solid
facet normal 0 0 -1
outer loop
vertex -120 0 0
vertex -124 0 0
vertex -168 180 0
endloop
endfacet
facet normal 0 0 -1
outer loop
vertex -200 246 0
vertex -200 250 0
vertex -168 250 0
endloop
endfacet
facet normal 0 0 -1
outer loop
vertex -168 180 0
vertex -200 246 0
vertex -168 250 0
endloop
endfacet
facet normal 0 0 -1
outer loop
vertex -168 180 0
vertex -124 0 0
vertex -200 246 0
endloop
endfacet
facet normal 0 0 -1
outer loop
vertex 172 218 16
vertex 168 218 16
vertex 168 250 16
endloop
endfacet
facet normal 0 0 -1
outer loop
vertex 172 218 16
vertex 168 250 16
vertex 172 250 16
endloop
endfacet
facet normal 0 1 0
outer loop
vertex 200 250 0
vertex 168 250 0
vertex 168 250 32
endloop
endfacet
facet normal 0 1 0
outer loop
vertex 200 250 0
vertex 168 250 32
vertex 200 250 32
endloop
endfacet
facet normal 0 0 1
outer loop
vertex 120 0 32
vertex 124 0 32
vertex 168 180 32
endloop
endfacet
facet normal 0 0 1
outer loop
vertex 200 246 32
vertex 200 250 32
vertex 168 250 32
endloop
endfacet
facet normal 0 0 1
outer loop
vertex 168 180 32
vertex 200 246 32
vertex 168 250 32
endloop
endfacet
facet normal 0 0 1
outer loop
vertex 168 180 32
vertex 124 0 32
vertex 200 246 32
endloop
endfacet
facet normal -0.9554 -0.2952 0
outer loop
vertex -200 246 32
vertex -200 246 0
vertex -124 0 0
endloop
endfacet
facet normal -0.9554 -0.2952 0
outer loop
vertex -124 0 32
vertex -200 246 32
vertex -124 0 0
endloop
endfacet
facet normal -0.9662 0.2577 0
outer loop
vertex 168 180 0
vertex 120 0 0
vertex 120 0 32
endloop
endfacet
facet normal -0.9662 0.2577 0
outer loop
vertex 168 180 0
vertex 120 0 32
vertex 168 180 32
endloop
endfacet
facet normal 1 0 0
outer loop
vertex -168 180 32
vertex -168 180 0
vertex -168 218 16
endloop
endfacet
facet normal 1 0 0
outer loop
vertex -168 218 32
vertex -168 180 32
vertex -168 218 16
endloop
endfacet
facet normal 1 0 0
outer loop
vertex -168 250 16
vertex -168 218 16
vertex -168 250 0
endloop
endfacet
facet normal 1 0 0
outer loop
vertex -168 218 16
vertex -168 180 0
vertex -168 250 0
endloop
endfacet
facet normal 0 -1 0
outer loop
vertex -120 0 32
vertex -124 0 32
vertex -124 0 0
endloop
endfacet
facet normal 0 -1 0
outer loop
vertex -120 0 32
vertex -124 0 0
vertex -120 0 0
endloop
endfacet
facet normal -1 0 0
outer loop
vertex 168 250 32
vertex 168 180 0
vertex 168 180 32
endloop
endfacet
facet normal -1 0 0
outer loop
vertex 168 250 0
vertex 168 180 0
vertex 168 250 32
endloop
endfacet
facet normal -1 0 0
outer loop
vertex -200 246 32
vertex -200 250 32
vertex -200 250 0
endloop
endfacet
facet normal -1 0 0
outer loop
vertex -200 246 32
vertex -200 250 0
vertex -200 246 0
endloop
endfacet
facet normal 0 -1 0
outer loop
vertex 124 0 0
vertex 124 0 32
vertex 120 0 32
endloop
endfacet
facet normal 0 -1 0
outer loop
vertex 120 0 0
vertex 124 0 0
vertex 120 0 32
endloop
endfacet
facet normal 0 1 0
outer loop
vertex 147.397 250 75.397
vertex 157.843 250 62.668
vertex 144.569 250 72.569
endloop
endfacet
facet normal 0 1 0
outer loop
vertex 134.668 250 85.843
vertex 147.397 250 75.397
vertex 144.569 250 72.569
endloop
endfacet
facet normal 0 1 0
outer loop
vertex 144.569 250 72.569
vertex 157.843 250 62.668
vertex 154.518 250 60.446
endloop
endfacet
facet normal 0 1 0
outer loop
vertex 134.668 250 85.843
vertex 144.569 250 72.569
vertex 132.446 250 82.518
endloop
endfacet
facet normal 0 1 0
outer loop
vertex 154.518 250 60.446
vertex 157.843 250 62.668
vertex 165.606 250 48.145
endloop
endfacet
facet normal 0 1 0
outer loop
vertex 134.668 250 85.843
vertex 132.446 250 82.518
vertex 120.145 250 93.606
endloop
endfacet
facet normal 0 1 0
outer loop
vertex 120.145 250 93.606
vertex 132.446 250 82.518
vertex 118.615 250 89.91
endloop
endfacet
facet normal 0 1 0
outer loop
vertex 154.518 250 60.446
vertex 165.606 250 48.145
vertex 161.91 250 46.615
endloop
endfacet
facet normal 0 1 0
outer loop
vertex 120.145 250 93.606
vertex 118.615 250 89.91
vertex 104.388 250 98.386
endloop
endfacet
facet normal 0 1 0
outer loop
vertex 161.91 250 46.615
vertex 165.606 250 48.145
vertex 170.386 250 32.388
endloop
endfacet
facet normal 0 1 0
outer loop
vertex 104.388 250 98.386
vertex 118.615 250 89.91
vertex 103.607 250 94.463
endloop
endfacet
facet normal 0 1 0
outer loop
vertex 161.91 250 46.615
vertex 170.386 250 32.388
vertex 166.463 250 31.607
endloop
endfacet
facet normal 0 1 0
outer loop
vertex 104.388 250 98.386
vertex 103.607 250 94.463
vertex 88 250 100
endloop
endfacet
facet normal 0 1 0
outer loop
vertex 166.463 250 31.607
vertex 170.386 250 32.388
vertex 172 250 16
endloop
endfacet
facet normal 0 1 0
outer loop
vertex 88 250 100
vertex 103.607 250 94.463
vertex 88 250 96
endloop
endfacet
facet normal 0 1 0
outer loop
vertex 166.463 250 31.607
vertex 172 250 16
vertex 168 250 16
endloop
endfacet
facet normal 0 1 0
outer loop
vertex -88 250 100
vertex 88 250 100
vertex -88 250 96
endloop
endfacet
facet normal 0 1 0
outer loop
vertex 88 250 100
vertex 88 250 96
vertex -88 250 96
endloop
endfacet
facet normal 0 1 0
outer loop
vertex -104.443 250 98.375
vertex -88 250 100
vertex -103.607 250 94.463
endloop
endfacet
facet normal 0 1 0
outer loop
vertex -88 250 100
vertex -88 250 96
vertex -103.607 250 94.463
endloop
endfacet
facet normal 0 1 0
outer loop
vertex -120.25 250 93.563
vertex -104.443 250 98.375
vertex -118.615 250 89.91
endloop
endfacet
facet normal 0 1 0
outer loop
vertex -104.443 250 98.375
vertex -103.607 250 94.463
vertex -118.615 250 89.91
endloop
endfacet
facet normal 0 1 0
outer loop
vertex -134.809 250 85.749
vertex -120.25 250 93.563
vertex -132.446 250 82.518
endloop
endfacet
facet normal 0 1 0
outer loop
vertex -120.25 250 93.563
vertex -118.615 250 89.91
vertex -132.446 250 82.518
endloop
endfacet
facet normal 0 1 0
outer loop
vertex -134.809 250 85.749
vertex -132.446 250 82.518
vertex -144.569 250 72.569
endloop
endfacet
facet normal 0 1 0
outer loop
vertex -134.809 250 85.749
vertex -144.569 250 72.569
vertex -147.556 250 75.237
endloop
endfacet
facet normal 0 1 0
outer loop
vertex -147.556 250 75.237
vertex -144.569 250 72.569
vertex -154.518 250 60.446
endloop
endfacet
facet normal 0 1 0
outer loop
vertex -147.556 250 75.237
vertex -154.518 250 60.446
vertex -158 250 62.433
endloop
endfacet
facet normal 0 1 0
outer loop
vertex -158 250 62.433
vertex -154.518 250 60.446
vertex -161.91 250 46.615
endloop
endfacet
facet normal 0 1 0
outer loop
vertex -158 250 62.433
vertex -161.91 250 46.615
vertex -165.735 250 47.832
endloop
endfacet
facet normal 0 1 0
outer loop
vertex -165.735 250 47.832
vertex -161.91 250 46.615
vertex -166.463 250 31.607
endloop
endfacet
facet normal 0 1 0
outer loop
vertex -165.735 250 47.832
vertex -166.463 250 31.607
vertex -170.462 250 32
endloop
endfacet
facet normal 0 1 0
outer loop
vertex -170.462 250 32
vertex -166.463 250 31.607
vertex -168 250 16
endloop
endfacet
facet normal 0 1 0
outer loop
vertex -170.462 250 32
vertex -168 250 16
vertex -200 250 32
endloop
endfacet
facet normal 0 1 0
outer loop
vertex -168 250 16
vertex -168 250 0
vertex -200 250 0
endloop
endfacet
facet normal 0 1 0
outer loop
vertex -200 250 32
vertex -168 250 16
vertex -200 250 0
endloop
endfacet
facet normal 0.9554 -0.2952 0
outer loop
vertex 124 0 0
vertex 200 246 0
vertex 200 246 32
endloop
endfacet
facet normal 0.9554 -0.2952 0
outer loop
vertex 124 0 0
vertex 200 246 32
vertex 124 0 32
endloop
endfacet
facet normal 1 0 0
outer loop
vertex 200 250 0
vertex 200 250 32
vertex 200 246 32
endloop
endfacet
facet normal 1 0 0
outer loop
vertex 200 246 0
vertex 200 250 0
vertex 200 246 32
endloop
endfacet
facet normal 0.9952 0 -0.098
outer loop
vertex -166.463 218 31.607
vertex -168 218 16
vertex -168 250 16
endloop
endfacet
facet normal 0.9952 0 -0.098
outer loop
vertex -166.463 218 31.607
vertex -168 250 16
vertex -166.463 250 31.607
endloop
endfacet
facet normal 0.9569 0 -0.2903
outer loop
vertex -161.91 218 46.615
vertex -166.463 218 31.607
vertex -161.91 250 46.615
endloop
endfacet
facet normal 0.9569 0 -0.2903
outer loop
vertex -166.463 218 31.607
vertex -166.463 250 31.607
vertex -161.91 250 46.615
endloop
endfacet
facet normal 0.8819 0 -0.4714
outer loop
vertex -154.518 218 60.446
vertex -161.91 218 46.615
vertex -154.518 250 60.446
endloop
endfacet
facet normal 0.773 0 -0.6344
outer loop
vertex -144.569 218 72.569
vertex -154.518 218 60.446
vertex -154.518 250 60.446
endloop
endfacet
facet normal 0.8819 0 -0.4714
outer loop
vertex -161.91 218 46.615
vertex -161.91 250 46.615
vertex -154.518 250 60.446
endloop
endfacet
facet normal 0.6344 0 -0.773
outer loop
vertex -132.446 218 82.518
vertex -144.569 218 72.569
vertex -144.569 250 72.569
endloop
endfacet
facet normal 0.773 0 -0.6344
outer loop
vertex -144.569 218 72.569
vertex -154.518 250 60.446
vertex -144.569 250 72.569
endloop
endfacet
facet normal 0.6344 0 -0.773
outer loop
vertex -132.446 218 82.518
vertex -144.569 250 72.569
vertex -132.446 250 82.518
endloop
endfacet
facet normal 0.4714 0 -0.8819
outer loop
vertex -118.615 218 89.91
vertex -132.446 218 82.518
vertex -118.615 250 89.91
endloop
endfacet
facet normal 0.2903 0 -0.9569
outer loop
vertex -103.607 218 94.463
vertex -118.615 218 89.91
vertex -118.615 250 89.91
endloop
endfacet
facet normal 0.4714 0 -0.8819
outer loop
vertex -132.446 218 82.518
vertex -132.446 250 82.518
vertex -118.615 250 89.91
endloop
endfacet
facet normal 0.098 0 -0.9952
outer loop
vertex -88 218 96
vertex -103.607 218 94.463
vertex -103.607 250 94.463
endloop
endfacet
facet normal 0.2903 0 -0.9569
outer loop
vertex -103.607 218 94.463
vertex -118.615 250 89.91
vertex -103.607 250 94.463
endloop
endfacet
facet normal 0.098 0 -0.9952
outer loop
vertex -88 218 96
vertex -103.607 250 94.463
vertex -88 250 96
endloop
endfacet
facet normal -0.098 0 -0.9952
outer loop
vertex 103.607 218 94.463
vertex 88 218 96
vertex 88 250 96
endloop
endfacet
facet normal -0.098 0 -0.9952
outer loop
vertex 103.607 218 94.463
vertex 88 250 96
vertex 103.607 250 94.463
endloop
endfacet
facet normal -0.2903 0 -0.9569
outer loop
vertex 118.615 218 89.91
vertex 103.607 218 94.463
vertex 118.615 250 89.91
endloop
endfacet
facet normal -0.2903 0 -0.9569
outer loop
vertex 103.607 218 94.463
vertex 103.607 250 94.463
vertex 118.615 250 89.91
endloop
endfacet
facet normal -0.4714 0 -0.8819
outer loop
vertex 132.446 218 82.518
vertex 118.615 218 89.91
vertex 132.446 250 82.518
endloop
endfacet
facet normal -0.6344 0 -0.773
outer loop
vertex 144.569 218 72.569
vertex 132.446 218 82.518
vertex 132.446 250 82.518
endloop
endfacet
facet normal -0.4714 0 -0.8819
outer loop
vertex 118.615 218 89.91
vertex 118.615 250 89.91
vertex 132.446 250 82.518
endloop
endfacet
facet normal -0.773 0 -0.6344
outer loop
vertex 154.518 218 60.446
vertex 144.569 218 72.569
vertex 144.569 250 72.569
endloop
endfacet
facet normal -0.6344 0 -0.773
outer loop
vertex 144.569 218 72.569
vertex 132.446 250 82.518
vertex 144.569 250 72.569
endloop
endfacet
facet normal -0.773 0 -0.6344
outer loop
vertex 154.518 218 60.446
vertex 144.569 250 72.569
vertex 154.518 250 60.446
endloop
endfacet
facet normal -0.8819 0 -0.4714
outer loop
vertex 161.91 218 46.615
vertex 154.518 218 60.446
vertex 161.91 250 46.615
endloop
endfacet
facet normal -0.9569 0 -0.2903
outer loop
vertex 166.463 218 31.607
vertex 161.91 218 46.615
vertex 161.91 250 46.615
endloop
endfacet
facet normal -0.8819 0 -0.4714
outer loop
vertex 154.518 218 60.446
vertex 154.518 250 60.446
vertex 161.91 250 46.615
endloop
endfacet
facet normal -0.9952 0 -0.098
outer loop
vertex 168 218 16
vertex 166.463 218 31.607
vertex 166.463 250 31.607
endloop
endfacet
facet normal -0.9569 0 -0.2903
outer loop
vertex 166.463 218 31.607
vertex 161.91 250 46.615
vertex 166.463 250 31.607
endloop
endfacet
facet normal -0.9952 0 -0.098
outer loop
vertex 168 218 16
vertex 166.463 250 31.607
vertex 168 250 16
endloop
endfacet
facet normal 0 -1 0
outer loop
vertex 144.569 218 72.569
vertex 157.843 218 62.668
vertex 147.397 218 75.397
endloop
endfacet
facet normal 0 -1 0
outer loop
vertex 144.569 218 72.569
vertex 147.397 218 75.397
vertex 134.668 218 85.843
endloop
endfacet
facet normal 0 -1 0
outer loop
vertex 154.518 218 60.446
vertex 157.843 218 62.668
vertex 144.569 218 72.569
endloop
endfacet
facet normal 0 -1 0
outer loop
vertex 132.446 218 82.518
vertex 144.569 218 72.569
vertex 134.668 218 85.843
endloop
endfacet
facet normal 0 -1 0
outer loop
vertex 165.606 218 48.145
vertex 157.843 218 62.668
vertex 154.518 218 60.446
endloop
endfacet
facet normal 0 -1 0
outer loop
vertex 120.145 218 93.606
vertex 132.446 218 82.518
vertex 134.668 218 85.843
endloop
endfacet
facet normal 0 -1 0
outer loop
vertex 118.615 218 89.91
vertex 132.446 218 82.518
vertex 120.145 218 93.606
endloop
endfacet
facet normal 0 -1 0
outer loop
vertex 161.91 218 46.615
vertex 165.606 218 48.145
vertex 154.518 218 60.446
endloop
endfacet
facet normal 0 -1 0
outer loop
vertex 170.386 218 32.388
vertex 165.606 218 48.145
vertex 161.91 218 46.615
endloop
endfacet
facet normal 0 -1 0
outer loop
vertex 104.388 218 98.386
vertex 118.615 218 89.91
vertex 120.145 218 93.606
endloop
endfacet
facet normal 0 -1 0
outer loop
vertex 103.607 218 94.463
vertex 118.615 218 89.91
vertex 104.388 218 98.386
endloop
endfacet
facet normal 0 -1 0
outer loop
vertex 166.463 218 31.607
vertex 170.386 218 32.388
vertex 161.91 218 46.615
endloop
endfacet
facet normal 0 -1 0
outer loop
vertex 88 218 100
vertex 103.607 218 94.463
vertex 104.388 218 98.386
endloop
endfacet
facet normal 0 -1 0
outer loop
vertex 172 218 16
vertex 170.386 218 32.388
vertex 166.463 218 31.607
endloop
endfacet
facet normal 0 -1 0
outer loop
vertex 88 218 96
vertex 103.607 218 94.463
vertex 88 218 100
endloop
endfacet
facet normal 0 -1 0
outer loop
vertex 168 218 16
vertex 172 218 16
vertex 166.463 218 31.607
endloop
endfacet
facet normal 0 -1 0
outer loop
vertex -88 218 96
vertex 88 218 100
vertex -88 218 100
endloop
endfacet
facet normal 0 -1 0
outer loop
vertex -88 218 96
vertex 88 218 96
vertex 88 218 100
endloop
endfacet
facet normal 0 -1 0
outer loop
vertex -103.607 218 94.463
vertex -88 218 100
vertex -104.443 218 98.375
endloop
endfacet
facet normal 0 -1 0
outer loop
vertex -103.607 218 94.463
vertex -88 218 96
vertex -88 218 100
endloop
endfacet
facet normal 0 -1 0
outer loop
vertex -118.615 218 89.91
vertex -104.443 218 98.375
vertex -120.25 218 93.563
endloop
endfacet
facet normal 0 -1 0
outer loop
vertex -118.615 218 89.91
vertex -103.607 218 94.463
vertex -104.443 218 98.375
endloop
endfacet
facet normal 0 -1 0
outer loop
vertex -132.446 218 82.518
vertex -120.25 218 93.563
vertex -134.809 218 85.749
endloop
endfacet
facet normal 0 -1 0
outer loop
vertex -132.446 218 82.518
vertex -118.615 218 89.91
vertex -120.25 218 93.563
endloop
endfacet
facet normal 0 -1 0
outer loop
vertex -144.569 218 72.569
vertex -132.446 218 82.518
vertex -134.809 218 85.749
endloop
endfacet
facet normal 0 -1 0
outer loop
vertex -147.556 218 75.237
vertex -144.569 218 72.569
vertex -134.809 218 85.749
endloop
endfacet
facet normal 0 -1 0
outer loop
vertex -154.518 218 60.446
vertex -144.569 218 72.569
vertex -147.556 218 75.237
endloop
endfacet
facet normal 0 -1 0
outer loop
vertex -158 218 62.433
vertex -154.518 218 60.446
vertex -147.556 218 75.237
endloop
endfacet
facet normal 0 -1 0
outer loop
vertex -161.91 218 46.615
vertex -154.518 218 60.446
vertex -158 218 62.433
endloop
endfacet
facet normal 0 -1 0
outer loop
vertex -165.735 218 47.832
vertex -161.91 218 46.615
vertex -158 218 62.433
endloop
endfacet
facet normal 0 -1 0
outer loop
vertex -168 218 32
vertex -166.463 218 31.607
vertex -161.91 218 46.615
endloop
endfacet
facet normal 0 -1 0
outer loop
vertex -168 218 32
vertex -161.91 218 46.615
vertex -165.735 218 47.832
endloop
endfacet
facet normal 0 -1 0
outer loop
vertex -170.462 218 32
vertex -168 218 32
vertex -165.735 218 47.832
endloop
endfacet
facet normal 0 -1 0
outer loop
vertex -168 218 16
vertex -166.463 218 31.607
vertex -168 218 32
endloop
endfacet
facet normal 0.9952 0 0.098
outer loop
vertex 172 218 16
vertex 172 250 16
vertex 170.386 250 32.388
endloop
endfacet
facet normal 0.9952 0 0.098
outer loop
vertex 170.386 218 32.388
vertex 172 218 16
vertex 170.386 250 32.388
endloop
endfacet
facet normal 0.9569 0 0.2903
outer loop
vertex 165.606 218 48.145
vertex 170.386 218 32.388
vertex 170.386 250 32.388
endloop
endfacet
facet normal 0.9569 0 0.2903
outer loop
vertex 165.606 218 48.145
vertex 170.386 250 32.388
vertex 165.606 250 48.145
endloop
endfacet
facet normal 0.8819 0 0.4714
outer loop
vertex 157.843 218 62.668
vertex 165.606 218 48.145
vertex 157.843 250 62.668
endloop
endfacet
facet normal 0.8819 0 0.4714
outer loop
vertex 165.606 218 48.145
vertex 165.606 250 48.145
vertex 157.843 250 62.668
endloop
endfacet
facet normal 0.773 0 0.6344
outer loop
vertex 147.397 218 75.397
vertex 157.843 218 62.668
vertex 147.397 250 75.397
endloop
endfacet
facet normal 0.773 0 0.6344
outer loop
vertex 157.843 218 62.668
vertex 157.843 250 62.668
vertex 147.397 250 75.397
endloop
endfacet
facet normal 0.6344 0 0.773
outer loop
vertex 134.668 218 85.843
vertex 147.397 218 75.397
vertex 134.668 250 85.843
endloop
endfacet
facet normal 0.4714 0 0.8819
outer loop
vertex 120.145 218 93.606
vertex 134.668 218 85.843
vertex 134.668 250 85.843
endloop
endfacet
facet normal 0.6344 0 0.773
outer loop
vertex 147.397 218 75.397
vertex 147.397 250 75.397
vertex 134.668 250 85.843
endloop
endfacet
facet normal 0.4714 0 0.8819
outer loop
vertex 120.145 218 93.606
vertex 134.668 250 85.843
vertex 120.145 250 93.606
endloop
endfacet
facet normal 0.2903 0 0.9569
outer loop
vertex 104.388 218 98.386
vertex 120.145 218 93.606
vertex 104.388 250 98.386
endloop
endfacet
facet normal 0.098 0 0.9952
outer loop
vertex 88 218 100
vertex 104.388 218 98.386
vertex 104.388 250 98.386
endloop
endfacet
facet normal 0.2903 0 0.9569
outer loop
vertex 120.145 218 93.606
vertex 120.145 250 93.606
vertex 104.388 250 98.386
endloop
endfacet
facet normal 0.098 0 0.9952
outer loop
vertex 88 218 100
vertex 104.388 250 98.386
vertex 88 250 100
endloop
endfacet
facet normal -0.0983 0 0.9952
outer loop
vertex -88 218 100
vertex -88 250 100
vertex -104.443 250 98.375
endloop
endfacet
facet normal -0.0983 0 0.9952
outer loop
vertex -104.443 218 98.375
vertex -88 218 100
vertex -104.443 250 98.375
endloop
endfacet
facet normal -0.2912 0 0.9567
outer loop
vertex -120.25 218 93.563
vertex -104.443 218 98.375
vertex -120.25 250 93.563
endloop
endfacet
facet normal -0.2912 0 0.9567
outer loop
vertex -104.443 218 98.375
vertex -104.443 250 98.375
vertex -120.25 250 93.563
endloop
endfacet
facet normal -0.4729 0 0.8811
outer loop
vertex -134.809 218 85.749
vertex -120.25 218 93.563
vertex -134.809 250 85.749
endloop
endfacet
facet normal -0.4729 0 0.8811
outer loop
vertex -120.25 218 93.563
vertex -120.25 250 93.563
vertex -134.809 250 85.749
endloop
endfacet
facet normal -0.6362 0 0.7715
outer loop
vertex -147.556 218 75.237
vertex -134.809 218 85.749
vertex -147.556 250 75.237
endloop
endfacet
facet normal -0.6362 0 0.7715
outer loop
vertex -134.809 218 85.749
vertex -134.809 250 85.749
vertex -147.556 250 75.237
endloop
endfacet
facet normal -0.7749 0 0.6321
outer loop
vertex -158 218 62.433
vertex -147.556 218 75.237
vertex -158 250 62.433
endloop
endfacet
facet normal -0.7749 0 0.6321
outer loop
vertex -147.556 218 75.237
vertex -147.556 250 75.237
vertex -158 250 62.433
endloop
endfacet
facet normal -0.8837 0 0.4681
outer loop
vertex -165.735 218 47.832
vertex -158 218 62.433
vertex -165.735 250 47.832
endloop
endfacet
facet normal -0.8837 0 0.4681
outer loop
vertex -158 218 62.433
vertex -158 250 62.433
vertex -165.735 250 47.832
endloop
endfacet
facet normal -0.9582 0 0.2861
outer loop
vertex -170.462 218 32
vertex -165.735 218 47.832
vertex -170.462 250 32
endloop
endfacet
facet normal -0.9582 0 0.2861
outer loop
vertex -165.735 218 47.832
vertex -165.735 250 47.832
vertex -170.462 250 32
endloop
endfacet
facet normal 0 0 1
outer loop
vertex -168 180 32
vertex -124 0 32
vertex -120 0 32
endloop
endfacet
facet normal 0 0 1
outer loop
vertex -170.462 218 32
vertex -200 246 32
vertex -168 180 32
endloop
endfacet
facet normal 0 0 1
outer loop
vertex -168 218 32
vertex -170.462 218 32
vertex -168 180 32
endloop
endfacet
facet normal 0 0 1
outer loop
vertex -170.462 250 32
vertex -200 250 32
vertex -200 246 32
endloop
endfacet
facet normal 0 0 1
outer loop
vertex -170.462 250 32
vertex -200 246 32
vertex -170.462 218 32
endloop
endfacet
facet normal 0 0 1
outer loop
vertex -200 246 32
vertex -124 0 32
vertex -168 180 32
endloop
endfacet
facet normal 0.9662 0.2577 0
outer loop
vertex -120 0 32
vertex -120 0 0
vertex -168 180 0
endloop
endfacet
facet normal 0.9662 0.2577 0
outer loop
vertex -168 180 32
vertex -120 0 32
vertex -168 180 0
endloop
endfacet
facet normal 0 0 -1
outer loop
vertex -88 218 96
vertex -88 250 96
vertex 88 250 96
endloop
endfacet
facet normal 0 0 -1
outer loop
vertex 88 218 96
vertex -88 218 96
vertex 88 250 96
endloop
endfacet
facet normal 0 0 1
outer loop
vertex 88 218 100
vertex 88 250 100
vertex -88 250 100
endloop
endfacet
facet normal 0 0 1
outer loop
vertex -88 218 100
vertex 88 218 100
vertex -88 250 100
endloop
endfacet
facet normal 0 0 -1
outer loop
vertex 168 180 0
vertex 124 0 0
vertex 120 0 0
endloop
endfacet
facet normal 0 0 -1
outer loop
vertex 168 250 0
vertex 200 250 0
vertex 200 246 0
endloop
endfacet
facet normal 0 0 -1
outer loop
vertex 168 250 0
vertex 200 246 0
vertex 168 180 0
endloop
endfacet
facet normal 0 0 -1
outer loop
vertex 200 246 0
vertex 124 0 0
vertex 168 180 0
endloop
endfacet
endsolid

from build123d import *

# Parameters (mm, degrees)
EXTRUDE_3_DEPTH   = 32
EXTRUDE_3_2_DEPTH = 32
EXTRUDE_5_DEPTH   = 32


with BuildPart() as part:
    # 草图12 → 凸台-拉伸3 (new body)
    with BuildSketch(Plane.XY):
        Polygon((-124, 0), (-120, 0), (-168, 180), (-168, 250), (-200, 250), (-200, 246), align=None)
    extrude(amount=EXTRUDE_3_DEPTH)

    # 草图13 → 凸台-拉伸5 (add)
    with BuildSketch(Plane(origin=(0, 250, 0), x_dir=(1, 0, 0), z_dir=(0, 1, 0))):
        with BuildLine():
            Line((-88, -96), (88, -96))
            ThreePointArc((88, -96), (144.568542495, -72.568542495), (168, -16))
            Line((168, -16), (172, -16))
            ThreePointArc((172, -16), (147.39696962, -75.39696962), (88, -100))
            Line((88, -100), (-88, -100))
            ThreePointArc((-88, -100), (-147.39696962, -75.39696962), (-172, -16))
            Line((-172, -16), (-168, -16))
            ThreePointArc((-168, -16), (-144.568542495, -72.568542495), (-88, -96))
        make_face()
    extrude(amount=-EXTRUDE_5_DEPTH)


with BuildPart() as body_2:
    # 草图12 → Extrude 3 2 (new body)
    with BuildSketch(Plane.XY):
        Polygon((120, 0), (168, 180), (168, 250), (200, 250), (200, 246), (124, 0), align=None)
    extrude(amount=EXTRUDE_3_2_DEPTH)


solid = Compound([part.part, body_2.part])
